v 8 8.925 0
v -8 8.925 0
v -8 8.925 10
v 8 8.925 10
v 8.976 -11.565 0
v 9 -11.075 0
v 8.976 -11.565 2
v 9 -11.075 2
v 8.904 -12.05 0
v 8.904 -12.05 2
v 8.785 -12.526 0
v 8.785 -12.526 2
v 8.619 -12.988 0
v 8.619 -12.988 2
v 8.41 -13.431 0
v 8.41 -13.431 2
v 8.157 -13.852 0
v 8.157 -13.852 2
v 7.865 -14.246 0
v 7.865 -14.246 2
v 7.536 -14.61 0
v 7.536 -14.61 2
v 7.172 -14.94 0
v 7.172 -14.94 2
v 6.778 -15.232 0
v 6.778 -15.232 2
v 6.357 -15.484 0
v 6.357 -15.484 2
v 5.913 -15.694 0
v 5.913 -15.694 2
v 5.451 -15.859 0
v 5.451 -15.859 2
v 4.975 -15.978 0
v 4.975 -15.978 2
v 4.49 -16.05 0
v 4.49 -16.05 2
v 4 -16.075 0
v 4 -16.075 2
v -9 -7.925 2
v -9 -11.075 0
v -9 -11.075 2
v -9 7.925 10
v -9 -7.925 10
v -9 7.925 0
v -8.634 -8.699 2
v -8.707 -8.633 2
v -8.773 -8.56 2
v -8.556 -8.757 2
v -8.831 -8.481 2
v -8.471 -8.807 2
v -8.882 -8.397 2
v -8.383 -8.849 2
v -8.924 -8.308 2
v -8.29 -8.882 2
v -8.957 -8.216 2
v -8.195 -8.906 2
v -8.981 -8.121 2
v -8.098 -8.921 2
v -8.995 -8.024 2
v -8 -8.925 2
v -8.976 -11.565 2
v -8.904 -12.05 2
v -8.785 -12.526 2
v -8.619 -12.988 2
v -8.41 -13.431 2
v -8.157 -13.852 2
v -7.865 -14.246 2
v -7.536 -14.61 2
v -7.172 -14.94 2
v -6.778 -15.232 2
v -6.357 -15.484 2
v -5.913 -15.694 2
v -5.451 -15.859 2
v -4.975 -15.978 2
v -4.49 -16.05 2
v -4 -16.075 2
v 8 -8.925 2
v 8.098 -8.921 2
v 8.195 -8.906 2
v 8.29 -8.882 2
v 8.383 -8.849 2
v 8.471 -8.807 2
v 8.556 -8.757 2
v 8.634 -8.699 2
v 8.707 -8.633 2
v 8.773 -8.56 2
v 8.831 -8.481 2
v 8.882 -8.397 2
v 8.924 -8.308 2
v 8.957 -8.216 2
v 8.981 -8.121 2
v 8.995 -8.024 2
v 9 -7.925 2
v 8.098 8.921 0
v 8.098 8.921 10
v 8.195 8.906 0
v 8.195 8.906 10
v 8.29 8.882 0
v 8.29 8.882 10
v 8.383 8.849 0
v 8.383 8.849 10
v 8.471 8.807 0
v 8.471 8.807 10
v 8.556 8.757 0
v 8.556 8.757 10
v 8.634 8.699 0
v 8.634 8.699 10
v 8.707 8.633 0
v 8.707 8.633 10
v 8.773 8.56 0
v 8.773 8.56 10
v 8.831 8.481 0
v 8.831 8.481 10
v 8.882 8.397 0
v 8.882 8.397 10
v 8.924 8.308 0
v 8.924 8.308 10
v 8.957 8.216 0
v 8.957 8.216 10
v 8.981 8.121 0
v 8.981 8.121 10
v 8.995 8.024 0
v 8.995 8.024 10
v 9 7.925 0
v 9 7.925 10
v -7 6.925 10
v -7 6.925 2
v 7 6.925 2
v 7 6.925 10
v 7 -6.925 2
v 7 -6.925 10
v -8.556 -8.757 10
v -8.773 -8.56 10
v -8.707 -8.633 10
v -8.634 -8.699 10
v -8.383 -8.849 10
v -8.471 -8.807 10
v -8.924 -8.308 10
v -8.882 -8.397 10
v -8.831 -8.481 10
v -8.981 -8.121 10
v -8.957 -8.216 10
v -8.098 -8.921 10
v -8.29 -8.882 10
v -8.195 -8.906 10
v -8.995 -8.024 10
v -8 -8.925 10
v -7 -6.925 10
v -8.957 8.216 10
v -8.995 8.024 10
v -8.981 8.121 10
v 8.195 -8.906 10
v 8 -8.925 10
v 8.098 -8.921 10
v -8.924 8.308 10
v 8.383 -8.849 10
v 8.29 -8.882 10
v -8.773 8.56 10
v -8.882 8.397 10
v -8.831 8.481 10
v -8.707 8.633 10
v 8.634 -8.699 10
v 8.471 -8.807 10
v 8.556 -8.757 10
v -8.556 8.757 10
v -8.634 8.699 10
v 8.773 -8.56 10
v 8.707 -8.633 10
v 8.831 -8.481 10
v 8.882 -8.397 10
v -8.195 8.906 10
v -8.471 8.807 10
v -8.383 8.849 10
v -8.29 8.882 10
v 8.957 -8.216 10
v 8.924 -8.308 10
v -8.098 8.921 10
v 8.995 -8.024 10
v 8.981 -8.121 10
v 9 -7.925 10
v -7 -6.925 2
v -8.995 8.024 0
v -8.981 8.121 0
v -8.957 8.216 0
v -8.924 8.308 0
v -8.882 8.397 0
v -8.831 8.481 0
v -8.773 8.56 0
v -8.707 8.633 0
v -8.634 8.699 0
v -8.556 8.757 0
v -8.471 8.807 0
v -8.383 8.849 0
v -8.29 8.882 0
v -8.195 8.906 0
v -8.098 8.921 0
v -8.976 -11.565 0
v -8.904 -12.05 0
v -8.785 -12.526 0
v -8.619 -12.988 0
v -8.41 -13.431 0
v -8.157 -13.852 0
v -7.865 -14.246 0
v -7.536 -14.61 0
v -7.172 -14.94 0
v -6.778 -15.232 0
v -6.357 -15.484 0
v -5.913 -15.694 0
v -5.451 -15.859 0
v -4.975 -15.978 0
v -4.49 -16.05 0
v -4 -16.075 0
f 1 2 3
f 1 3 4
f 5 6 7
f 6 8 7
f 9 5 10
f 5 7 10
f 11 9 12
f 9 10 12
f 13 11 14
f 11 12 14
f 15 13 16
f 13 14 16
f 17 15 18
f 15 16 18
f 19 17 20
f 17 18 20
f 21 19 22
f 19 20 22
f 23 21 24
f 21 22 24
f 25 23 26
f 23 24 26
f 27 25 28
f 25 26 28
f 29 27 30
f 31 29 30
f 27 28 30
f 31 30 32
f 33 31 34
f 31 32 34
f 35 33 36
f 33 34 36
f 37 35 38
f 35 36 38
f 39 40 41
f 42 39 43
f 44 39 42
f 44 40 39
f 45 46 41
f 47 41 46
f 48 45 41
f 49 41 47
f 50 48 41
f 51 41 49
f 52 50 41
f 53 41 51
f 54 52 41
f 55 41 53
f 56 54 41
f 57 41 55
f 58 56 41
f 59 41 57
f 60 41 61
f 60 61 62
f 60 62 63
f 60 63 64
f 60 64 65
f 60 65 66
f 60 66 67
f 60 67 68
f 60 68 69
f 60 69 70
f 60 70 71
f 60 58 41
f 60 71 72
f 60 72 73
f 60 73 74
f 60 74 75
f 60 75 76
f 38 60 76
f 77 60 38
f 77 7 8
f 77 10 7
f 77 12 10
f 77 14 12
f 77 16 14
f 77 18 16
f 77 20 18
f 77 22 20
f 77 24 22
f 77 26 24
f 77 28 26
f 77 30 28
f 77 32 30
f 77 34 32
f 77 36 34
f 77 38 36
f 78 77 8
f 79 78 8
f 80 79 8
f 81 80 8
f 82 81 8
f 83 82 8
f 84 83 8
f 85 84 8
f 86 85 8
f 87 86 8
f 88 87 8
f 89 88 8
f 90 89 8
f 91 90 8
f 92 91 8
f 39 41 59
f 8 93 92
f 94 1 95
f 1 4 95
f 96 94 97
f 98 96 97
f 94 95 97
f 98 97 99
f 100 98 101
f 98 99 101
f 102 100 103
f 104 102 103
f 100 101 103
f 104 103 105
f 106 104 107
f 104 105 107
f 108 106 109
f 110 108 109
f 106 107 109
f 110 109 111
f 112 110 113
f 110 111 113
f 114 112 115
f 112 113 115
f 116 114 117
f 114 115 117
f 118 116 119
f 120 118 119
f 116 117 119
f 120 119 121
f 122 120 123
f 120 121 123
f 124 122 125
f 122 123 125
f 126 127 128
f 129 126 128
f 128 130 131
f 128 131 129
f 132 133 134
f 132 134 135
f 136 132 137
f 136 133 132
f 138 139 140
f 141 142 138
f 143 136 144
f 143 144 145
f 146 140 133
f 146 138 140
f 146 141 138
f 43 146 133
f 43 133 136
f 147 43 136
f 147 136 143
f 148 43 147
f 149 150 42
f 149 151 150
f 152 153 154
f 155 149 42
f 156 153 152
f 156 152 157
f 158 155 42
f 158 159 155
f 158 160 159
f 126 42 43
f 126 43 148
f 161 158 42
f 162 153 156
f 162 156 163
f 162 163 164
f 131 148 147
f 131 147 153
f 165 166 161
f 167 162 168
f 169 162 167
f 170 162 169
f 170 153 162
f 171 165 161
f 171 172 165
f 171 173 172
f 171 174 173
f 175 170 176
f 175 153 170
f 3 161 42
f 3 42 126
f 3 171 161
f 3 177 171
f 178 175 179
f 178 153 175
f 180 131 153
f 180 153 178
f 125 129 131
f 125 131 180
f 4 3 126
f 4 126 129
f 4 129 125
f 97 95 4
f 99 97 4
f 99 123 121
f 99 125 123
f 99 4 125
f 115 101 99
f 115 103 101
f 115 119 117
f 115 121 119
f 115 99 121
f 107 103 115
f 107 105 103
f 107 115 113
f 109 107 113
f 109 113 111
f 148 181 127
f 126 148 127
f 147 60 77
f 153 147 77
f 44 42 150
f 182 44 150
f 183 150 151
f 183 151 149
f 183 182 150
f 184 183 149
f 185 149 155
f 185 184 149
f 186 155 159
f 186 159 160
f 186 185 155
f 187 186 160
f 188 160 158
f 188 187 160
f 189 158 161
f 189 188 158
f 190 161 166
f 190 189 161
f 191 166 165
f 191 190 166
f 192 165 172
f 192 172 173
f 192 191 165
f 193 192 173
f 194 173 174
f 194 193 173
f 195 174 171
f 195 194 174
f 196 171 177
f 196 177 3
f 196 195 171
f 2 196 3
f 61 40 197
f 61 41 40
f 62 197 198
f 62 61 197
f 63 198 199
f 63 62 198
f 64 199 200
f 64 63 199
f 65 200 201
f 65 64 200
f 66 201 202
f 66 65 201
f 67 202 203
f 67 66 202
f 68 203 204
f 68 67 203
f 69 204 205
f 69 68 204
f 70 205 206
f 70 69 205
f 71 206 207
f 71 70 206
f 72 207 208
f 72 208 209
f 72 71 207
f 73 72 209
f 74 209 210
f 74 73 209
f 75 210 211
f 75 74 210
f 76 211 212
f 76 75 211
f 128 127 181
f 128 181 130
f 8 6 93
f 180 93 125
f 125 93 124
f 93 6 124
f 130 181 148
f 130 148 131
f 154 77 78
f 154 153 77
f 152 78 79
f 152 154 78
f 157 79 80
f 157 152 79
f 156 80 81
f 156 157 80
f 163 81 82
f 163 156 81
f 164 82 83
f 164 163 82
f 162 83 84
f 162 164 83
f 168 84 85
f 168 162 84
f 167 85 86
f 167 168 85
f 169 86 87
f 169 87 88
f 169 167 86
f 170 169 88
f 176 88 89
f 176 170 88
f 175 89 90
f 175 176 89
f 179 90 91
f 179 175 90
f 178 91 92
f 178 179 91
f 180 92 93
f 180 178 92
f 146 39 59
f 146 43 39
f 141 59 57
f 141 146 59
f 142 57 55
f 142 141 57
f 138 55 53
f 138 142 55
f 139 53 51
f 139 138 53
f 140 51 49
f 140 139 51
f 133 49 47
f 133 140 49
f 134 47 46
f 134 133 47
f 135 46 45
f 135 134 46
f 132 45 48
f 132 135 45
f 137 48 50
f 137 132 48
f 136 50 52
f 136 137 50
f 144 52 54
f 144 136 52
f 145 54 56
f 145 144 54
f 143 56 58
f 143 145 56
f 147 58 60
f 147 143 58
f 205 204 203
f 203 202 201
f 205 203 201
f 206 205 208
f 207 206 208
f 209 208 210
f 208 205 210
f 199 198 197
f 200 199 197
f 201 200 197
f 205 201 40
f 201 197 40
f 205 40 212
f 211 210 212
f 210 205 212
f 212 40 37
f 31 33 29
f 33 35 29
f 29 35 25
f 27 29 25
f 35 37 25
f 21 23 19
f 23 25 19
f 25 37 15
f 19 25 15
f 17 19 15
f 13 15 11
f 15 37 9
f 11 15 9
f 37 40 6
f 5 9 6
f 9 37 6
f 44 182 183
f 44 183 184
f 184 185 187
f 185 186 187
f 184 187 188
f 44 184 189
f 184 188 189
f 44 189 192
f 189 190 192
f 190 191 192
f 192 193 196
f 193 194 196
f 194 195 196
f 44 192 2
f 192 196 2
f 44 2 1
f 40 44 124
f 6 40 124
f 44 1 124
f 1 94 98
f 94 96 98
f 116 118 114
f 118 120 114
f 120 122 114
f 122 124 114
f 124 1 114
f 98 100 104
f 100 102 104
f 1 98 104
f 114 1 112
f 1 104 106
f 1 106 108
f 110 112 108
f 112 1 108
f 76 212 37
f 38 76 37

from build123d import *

# Parameters (mm, degrees)
F0_W     = 18
F0_H     = 17.850996
F0_W_2   = 14
F0_H_2   = 13.850996
F1_DEPTH = 10
F2_W     = 18
F2_H     = 25
F3_DEPTH = 2
F4_R     = 5
F5_R     = 1


with BuildPart() as f1:
    # F0 (on Top) → F1 (new body)
    with BuildSketch(Plane.XY):
        Rectangle(F0_W, F0_H)
        Rectangle(F0_W_2, F0_H_2, mode=Mode.SUBTRACT)
    extrude(amount=F1_DEPTH)

    # F2 (on Top) → F3 (join)
    with BuildSketch(Plane.XY):
        with Locations((0, -3.574502)):
            Rectangle(F2_W, F2_H)
    extrude(amount=F3_DEPTH)

    # F4
    f4_edges = [f1.edges().sort_by_distance(p)[0] for p in [
        (9, -16.074502, 1),
        (-9, -16.074502, 1),
    ]]
    fillet(f4_edges, radius=F4_R)

    # F5
    f5_edges = [f1.edges().sort_by_distance(p)[0] for p in [
        (9, -8.925498, 6),
        (-9, -8.925498, 6),
        (-9, 8.925498, 5),
        (9, 8.925498, 5),
    ]]
    fillet(f5_edges, radius=F5_R)


solid = f1.part
